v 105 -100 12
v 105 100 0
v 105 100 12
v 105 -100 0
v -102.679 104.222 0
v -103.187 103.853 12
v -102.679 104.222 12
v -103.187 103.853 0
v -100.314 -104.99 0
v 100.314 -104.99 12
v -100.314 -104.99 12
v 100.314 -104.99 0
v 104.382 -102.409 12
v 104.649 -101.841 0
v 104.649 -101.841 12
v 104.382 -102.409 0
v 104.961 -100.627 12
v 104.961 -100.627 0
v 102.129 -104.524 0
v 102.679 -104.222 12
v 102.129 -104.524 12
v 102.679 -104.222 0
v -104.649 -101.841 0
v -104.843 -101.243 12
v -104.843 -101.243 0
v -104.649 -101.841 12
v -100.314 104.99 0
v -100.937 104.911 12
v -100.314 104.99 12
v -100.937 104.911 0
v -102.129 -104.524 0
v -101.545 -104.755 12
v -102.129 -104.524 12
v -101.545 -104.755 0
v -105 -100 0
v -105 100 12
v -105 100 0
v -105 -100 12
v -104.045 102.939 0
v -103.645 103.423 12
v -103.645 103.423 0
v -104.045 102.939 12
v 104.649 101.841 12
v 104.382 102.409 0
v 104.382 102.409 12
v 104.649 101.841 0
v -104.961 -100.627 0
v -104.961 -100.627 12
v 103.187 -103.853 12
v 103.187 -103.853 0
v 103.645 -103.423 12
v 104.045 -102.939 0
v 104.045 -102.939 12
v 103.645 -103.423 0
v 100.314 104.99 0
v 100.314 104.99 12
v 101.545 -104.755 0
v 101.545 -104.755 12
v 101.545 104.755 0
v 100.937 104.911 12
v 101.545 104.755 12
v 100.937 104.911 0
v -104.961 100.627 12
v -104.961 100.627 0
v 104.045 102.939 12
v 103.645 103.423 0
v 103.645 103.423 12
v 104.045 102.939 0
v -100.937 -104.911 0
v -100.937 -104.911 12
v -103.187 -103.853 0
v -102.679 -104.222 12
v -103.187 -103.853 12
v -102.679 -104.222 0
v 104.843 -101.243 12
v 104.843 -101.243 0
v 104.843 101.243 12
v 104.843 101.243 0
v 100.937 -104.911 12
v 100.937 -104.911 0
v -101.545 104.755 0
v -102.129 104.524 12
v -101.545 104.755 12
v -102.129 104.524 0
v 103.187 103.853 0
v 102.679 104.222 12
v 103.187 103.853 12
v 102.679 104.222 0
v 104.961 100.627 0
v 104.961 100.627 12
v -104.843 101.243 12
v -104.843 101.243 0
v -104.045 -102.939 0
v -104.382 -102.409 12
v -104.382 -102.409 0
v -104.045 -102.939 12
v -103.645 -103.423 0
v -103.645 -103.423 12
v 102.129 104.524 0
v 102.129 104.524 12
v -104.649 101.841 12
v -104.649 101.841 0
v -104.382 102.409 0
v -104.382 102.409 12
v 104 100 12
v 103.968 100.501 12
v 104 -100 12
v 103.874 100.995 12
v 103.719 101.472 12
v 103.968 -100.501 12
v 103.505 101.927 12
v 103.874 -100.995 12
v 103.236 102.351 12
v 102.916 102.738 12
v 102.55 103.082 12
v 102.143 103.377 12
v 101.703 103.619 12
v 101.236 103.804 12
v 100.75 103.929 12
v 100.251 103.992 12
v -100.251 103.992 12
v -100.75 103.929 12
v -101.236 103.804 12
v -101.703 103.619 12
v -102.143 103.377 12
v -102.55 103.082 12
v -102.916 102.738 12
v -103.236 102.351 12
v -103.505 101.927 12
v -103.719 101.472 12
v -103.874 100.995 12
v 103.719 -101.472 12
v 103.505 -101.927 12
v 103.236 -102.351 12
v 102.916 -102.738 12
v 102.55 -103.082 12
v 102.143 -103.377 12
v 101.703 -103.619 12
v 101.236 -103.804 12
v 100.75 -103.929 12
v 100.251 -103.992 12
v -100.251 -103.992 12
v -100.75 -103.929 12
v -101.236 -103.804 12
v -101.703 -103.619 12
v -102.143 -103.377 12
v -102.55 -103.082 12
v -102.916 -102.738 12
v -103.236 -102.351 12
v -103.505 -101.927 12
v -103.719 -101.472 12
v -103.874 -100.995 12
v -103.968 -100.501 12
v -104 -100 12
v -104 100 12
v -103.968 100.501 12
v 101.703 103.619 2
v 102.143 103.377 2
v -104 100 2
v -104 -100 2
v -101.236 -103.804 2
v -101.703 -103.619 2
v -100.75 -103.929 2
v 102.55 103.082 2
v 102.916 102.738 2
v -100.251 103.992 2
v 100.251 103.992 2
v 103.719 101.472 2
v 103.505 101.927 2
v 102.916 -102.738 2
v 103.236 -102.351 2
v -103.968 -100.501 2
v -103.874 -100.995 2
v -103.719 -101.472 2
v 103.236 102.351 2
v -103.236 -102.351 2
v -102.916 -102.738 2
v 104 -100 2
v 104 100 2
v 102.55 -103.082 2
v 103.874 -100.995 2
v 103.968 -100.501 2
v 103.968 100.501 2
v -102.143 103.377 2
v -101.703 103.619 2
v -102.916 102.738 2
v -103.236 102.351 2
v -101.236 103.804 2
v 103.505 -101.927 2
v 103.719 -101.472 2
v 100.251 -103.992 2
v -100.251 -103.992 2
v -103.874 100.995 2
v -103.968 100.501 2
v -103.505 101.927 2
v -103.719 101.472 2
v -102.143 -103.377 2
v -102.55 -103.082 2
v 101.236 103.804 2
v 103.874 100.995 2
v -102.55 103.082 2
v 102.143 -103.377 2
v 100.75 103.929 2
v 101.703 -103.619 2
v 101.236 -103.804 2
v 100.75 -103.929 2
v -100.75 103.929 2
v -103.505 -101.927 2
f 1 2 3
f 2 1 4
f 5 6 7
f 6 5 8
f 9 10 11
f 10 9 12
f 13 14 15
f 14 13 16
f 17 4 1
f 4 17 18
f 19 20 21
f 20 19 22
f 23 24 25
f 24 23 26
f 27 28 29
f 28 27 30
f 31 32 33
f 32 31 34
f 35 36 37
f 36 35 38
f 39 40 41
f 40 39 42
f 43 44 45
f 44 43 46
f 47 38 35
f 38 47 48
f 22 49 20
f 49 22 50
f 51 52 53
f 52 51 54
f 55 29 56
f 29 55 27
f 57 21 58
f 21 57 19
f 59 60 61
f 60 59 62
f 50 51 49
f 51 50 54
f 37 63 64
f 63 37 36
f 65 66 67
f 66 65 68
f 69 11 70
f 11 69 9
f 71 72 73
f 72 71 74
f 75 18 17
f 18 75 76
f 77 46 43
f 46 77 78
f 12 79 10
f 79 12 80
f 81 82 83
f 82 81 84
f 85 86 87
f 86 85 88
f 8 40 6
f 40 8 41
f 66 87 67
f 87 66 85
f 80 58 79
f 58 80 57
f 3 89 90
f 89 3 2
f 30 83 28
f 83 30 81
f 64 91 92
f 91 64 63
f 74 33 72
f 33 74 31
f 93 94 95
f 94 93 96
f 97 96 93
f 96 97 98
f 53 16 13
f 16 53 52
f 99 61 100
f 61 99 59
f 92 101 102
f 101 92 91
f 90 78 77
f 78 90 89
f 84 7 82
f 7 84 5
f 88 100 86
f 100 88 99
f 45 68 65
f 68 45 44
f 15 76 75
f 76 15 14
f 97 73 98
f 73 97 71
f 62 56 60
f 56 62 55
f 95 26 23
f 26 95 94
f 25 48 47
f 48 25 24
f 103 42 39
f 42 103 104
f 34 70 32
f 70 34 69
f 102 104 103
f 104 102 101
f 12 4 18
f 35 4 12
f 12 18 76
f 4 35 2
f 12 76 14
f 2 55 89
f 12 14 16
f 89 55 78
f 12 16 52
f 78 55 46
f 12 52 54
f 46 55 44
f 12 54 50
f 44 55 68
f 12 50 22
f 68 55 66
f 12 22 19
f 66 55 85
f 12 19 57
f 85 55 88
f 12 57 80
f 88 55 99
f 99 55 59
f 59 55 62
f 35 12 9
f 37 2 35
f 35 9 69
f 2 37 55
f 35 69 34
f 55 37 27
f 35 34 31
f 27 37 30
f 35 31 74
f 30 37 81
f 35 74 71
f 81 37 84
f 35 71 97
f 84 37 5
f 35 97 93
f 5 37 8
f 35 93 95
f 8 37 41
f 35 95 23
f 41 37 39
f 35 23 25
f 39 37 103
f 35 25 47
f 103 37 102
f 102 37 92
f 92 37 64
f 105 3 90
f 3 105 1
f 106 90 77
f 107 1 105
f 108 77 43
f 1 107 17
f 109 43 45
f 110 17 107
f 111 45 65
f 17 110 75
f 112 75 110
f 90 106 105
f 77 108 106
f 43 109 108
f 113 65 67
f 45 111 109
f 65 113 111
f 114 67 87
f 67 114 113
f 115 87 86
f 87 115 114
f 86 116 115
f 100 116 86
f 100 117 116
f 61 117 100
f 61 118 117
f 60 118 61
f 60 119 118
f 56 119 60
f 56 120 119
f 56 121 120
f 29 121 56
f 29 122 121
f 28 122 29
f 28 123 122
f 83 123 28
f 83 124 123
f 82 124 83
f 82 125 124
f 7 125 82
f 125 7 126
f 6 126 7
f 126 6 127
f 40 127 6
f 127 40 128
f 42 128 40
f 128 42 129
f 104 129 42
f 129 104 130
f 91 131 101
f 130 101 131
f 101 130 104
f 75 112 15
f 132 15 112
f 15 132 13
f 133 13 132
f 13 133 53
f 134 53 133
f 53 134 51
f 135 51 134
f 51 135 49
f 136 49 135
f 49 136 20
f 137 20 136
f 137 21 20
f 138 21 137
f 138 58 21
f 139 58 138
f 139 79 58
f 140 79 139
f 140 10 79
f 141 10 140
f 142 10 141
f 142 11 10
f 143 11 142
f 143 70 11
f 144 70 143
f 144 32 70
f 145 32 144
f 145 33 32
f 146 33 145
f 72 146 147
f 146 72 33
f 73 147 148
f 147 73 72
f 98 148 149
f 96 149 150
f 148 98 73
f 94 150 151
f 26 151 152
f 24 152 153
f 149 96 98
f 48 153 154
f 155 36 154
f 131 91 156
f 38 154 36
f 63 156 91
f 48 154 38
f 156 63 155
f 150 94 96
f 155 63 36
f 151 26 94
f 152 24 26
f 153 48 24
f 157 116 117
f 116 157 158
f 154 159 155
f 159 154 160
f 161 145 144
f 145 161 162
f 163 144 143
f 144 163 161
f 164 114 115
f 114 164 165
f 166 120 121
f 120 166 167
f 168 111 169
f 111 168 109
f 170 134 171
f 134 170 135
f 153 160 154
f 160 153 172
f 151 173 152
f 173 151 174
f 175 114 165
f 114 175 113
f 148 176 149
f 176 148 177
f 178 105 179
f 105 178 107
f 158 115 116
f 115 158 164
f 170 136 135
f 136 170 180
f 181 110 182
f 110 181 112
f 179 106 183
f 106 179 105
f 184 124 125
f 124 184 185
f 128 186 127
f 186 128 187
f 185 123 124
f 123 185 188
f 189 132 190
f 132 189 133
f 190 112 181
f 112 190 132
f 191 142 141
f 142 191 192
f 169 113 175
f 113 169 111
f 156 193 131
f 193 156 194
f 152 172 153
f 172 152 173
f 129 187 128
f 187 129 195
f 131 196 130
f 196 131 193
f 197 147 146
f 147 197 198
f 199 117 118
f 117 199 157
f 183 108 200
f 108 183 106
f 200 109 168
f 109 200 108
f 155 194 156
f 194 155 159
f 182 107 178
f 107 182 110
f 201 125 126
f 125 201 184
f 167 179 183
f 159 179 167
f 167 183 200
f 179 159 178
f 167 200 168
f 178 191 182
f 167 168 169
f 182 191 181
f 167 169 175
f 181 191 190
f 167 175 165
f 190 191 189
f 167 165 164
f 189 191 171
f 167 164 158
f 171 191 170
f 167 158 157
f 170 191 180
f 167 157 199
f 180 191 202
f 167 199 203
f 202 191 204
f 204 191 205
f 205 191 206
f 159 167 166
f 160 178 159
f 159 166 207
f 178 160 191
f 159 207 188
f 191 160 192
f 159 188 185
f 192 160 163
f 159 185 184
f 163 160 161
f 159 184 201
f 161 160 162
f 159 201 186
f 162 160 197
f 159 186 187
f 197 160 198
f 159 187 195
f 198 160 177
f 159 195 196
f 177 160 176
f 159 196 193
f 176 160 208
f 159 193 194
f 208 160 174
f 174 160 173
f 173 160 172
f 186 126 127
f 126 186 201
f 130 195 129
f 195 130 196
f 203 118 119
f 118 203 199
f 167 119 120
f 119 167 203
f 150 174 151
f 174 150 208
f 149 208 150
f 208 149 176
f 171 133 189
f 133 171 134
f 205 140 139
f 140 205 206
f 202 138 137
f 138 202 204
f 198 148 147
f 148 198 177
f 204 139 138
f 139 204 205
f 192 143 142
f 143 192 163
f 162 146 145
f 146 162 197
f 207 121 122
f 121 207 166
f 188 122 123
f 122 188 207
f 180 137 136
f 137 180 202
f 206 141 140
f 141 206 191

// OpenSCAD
$fn = 50;


difference() {
	union() {
		hull() {
			translate(v = [-100.0000000000, 100.0000000000, 0]) {
				cylinder(h = 12, r = 5);
			}
			translate(v = [100.0000000000, 100.0000000000, 0]) {
				cylinder(h = 12, r = 5);
			}
			translate(v = [-100.0000000000, -100.0000000000, 0]) {
				cylinder(h = 12, r = 5);
			}
			translate(v = [100.0000000000, -100.0000000000, 0]) {
				cylinder(h = 12, r = 5);
			}
		}
	}
	union() {
		translate(v = [0, 0, 2]) {
			hull() {
				translate(v = [-100.0000000000, 100.0000000000, 0]) {
					cylinder(h = 10, r = 4);
				}
				translate(v = [100.0000000000, 100.0000000000, 0]) {
					cylinder(h = 10, r = 4);
				}
				translate(v = [-100.0000000000, -100.0000000000, 0]) {
					cylinder(h = 10, r = 4);
				}
				translate(v = [100.0000000000, -100.0000000000, 0]) {
					cylinder(h = 10, r = 4);
				}
			}
		}
	}
}
